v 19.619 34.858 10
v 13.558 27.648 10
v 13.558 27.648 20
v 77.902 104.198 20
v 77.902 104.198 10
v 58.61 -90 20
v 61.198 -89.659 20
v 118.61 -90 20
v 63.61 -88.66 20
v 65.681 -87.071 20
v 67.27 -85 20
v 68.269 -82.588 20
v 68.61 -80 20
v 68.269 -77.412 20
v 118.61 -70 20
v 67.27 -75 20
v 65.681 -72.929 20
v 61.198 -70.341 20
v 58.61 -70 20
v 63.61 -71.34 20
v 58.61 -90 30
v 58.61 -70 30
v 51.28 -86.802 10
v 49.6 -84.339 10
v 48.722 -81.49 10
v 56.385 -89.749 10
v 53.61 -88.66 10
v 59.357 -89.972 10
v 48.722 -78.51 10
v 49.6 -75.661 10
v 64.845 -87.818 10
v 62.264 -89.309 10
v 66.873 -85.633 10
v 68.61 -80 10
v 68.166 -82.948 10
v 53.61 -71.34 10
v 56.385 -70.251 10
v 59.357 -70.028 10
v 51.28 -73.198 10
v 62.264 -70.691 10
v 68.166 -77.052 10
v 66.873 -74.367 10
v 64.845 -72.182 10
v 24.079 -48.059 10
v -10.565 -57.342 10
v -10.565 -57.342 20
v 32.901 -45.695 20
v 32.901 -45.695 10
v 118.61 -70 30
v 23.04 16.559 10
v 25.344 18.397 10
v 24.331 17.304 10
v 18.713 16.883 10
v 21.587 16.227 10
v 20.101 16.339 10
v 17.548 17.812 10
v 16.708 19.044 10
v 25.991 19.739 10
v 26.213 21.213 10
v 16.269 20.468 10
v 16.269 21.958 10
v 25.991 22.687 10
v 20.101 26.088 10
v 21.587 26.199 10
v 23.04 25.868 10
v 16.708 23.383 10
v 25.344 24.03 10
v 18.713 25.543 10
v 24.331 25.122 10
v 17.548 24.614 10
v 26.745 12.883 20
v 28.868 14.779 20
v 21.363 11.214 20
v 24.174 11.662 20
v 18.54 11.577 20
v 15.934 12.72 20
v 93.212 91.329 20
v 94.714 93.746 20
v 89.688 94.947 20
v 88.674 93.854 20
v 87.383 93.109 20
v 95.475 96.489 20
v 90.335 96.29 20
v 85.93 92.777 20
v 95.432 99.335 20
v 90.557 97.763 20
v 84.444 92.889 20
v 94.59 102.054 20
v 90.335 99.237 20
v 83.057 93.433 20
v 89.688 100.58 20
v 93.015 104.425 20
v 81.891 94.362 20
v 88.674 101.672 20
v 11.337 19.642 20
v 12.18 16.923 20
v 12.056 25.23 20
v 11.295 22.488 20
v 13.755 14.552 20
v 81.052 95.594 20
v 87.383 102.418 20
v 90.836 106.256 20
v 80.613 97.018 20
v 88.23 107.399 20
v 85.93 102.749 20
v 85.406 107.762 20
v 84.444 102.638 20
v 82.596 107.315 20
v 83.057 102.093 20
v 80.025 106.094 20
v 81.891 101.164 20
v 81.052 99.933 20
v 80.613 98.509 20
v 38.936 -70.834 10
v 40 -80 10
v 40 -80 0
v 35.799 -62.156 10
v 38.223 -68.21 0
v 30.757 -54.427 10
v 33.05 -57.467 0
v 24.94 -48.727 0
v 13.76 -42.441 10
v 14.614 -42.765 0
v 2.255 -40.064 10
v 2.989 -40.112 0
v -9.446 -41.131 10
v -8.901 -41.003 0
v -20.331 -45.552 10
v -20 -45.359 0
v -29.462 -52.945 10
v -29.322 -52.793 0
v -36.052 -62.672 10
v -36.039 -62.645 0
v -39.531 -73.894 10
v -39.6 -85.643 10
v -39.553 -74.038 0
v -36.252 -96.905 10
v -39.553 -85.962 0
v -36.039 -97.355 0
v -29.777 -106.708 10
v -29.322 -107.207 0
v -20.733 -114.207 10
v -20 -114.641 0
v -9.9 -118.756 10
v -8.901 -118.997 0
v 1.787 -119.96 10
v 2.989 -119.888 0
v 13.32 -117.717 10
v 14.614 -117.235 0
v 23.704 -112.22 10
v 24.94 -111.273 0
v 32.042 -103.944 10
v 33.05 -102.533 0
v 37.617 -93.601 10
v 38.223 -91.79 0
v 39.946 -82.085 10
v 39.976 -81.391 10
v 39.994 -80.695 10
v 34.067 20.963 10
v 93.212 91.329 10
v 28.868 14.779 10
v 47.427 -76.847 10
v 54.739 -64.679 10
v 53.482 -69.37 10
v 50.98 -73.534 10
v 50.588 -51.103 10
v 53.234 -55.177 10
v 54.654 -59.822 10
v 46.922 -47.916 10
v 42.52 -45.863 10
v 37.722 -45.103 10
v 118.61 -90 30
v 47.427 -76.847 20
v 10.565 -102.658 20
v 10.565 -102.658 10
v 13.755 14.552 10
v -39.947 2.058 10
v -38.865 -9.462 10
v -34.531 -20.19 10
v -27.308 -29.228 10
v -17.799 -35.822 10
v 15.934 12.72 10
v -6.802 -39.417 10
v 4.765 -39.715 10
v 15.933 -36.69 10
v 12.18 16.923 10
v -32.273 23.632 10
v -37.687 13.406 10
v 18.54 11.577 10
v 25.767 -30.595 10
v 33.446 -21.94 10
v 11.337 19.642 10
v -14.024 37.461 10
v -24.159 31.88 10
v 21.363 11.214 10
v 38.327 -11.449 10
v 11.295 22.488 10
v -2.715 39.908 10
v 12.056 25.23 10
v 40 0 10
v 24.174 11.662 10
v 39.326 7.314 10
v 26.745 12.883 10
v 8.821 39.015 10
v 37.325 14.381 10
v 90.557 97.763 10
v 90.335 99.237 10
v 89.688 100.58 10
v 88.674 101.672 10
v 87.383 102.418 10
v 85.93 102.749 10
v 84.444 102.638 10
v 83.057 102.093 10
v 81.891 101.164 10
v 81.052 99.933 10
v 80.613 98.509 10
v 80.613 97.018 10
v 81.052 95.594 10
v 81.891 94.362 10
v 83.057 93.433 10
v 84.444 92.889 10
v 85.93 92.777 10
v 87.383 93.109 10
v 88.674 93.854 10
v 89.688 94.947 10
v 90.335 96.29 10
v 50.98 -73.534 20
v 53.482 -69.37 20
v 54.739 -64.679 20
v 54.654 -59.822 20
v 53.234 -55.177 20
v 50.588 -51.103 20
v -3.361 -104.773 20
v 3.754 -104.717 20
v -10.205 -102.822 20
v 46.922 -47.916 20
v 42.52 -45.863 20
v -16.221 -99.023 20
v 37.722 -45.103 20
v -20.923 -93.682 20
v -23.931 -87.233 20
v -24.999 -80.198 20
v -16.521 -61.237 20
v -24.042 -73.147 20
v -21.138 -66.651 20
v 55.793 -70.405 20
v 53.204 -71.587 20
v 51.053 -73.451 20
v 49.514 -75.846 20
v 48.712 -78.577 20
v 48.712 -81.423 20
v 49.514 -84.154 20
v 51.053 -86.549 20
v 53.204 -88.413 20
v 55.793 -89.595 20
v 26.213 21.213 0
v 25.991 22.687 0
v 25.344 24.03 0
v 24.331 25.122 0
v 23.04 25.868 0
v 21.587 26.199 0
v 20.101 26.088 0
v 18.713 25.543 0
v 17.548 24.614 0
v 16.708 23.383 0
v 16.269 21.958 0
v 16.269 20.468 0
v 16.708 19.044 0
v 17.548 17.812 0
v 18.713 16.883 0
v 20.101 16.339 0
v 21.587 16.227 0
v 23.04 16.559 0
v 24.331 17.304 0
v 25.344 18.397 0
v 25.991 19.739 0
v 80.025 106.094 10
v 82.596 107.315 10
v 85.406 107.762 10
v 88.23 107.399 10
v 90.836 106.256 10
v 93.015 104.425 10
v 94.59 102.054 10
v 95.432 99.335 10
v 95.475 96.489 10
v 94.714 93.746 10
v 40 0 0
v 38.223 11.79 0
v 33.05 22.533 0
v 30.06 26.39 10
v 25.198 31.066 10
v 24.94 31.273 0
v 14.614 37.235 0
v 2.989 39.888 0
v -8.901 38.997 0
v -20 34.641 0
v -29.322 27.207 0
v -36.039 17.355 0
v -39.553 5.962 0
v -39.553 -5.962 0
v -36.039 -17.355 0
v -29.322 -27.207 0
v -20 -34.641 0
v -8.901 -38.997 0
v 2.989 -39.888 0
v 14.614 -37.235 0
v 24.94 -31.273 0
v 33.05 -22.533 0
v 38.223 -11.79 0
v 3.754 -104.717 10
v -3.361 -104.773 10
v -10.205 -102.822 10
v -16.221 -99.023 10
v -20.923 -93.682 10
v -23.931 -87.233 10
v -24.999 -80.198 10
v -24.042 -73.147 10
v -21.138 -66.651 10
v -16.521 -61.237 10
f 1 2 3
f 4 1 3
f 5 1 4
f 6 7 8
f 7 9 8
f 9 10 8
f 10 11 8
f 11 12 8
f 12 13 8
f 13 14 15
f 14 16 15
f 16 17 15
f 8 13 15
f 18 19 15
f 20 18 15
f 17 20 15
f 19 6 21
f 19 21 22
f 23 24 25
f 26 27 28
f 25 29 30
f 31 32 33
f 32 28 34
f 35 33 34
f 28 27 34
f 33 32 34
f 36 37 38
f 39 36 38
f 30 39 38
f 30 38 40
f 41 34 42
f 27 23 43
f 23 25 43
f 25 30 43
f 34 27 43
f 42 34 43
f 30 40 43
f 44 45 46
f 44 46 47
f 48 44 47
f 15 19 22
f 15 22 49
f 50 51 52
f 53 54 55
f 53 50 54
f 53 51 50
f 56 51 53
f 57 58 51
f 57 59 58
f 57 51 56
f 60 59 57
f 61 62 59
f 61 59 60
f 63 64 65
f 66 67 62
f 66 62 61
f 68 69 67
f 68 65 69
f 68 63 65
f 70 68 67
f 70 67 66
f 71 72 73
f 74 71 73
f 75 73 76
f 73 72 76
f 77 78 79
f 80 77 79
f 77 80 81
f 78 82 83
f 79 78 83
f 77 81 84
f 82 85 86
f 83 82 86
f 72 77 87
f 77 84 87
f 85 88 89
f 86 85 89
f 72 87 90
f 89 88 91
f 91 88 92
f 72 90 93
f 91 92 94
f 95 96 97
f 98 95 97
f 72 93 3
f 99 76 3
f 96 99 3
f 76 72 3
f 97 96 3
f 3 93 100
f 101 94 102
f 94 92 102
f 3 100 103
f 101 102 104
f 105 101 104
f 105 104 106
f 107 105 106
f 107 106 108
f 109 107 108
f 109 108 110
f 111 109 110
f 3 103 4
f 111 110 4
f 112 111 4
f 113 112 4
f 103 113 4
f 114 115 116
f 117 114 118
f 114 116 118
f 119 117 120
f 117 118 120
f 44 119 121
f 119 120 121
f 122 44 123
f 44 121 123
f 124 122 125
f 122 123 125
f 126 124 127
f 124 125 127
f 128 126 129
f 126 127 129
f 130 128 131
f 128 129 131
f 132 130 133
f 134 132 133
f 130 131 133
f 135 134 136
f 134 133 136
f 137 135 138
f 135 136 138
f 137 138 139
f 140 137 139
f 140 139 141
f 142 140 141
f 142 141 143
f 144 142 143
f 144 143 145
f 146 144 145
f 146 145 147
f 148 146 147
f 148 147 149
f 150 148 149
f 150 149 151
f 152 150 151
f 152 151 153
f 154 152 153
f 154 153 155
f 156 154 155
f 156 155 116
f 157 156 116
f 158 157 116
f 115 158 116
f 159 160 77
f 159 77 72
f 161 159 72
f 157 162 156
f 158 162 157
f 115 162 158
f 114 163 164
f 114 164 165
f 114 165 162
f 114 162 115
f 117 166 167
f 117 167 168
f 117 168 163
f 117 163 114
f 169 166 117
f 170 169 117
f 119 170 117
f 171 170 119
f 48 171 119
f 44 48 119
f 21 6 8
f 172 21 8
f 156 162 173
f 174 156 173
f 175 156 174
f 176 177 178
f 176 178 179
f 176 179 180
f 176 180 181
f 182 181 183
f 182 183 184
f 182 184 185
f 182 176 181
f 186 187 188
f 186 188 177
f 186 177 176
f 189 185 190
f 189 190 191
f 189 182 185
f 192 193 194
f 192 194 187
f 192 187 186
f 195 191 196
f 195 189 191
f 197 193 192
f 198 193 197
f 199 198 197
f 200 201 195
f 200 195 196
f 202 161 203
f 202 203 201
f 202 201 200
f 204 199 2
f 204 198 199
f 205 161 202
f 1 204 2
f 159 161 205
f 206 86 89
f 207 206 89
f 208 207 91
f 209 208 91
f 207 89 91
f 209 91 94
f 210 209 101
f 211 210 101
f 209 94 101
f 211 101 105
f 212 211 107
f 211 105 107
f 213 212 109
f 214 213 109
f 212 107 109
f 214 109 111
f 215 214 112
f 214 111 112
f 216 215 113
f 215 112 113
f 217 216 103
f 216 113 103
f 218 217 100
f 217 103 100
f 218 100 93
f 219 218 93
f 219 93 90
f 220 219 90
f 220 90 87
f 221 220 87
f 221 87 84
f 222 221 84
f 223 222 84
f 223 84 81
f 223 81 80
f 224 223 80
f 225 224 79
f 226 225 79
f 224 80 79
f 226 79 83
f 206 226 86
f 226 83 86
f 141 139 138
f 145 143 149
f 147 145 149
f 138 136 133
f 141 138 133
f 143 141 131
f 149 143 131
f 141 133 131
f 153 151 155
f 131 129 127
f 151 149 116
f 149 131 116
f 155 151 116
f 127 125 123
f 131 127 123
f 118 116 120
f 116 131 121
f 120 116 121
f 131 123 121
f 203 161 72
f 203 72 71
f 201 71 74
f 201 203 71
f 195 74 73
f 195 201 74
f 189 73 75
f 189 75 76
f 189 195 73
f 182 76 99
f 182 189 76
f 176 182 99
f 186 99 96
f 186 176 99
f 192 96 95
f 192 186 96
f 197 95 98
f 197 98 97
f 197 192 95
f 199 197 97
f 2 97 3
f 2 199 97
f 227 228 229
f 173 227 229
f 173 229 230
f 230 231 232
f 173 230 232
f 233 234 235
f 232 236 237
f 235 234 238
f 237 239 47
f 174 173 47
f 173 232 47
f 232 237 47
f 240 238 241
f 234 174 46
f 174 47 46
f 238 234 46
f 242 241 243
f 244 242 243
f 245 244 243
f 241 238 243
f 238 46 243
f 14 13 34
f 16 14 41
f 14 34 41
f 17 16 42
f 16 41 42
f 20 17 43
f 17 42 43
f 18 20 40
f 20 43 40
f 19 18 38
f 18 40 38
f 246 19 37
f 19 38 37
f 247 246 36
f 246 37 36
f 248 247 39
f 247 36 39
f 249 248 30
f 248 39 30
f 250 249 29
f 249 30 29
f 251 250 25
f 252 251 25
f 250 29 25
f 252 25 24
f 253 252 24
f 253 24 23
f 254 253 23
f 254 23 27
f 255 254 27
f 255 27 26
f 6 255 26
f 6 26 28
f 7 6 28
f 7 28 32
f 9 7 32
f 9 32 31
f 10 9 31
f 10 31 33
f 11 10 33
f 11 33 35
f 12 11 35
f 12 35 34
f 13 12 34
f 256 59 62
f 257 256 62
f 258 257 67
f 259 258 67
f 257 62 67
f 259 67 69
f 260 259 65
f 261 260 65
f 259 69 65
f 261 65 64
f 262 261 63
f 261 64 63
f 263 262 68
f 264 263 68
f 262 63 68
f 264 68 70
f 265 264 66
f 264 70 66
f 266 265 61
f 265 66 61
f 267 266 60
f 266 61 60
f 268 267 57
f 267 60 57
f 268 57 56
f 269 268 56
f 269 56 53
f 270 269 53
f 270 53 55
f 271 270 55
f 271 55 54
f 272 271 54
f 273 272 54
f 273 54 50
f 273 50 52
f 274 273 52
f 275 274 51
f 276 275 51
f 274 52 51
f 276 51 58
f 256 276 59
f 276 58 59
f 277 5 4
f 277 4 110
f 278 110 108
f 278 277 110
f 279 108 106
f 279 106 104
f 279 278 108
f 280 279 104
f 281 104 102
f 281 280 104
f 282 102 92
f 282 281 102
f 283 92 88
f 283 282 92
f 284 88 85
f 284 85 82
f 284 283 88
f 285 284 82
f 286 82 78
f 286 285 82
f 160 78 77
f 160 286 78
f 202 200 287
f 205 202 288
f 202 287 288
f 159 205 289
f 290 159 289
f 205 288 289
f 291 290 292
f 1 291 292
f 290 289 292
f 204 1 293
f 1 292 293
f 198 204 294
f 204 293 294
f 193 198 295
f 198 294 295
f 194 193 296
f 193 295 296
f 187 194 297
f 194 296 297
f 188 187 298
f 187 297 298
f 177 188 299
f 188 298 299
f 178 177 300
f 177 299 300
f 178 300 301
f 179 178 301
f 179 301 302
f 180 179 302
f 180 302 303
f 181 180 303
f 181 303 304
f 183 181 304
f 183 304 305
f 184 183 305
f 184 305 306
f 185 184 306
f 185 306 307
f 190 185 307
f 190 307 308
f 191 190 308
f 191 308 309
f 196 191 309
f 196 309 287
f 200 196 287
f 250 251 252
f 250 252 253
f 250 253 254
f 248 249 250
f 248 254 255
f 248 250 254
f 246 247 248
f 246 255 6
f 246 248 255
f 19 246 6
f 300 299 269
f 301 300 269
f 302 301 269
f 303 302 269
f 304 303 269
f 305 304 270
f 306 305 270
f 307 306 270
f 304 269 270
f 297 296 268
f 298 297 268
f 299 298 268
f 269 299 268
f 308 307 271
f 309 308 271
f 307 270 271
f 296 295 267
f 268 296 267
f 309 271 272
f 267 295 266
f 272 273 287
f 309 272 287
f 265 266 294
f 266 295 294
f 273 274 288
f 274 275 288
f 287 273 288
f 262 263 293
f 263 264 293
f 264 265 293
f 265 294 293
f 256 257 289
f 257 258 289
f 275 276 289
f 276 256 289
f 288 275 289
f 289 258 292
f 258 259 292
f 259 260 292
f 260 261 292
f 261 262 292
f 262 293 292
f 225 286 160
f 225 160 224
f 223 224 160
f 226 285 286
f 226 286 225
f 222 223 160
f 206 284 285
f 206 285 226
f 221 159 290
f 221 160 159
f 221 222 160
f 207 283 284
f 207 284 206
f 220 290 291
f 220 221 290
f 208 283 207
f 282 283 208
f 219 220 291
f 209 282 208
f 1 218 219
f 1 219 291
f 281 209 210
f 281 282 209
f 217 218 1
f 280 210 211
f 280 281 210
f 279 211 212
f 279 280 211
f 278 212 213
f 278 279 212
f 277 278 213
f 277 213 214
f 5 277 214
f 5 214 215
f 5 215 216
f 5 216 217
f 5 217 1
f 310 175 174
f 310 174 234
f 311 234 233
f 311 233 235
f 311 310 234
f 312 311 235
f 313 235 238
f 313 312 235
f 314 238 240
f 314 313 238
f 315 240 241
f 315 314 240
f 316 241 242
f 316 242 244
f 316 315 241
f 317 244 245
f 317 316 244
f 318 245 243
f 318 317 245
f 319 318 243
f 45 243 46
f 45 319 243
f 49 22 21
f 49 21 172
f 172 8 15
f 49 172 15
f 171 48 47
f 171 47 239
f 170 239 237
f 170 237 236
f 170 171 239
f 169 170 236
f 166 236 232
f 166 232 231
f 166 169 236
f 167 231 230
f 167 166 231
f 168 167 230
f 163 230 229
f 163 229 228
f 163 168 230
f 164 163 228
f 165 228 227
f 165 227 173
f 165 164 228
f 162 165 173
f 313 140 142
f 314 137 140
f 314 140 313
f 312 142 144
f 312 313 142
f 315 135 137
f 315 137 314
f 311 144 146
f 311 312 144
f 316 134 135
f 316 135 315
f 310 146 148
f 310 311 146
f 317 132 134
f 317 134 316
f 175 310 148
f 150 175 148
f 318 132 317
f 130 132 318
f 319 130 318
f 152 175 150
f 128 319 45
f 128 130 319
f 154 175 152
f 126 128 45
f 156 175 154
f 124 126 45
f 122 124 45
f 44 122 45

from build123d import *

# Parameters (mm, degrees)
SKETCH_1_R          = 40
EXTRUDE_1_DEPTH     = 10
SKETCH_2_R          = 40
EXTRUDE_2_DEPTH     = 10
EXTRUDE_3_DEPTH     = 10
EXTRUDE_START       = 10
SKETCH_4_R          = 10
EXTRUDE_4_DEPTH     = 10
SKETCH_5_W          = 60
SKETCH_5_H          = 20
EXTRUDE_5_DEPTH     = 10
SKETCH_6_R          = 5
CUT_EXTRUDE_1_DEPTH = 10
EXTRUDE_6_DEPTH     = 10
SKETCH_8_R          = 5
CUT_EXTRUDE_2_DEPTH = 10


with BuildPart() as part:
    # 草图1 → 凸台-拉伸1 (new body)
    with BuildSketch(Plane.XY):
        Circle(SKETCH_1_R)
    extrude(amount=EXTRUDE_1_DEPTH)

    # 草图6 → 切除-拉伸1 (cut)
    with BuildSketch(Plane.XY.offset(10)):
        with Locations((21.213203436, 21.213203436)):
            Circle(SKETCH_6_R)
    extrude(amount=-CUT_EXTRUDE_1_DEPTH, mode=Mode.SUBTRACT)

    # 草图7 → 凸台-拉伸6 (add)
    with BuildSketch(Plane.XY.offset(10)):
        with BuildLine():
            Line((13.558194714, 27.647552002), (77.901680374, 104.19763922))
            ThreePointArc((77.901680374, 104.19763922), (91.991037662, 105.418299375), (93.211697818, 91.328942088))
            Line((93.211697818, 91.328942088), (28.868212157, 14.77885487))
            ThreePointArc((28.868212157, 14.77885487), (14.77885487, 13.558194714), (13.558194714, 27.647552002))
        make_face()
    extrude(amount=EXTRUDE_6_DEPTH)

    # 草图8 → 切除-拉伸2 (cut)
    with BuildSketch(Plane.XY.offset(20)):
        with Locations((85.556689096, 97.763290654)):
            Circle(SKETCH_8_R)
    extrude(amount=-CUT_EXTRUDE_2_DEPTH, mode=Mode.SUBTRACT)


with BuildPart() as body_2:
    # 草图2 → 凸台-拉伸2 (new body)
    with BuildSketch(Plane.XY):
        with Locations((0, -80)):
            Circle(SKETCH_2_R)
    extrude(amount=EXTRUDE_2_DEPTH)

    # 草图3 → 凸台-拉伸3 (add)
    with BuildSketch(Plane.XY.offset(10)):
        with BuildLine():
            Line((-10.565456544, -57.342305324), (32.901205639, -45.695448294))
            ThreePointArc((32.901205639, -45.695448294), (53.233777088, -55.176682071), (47.427298537, -76.84675504))
            Line((47.427298537, -76.84675504), (10.565456544, -102.657694676))
            ThreePointArc((10.565456544, -102.657694676), (-22.657694676, -90.565456544), (-10.565456544, -57.342305324))
        make_face()
    extrude(amount=EXTRUDE_3_DEPTH)


with BuildPart() as body_3:
    # 草图4 → 凸台-拉伸4 (new body)
    with BuildSketch(Plane.XY.offset(EXTRUDE_START)):
        with Locations((58.610156078, -80)):
            Circle(SKETCH_4_R)
    extrude(amount=EXTRUDE_4_DEPTH)

    # 草图5 → 凸台-拉伸5 (add)
    with BuildSketch(Plane.XY.offset(20)):
        with Locations((88.610156078, -80)):
            Rectangle(SKETCH_5_W, SKETCH_5_H)
    extrude(amount=EXTRUDE_5_DEPTH)


solid = Compound([part.part, body_2.part, body_3.part])
